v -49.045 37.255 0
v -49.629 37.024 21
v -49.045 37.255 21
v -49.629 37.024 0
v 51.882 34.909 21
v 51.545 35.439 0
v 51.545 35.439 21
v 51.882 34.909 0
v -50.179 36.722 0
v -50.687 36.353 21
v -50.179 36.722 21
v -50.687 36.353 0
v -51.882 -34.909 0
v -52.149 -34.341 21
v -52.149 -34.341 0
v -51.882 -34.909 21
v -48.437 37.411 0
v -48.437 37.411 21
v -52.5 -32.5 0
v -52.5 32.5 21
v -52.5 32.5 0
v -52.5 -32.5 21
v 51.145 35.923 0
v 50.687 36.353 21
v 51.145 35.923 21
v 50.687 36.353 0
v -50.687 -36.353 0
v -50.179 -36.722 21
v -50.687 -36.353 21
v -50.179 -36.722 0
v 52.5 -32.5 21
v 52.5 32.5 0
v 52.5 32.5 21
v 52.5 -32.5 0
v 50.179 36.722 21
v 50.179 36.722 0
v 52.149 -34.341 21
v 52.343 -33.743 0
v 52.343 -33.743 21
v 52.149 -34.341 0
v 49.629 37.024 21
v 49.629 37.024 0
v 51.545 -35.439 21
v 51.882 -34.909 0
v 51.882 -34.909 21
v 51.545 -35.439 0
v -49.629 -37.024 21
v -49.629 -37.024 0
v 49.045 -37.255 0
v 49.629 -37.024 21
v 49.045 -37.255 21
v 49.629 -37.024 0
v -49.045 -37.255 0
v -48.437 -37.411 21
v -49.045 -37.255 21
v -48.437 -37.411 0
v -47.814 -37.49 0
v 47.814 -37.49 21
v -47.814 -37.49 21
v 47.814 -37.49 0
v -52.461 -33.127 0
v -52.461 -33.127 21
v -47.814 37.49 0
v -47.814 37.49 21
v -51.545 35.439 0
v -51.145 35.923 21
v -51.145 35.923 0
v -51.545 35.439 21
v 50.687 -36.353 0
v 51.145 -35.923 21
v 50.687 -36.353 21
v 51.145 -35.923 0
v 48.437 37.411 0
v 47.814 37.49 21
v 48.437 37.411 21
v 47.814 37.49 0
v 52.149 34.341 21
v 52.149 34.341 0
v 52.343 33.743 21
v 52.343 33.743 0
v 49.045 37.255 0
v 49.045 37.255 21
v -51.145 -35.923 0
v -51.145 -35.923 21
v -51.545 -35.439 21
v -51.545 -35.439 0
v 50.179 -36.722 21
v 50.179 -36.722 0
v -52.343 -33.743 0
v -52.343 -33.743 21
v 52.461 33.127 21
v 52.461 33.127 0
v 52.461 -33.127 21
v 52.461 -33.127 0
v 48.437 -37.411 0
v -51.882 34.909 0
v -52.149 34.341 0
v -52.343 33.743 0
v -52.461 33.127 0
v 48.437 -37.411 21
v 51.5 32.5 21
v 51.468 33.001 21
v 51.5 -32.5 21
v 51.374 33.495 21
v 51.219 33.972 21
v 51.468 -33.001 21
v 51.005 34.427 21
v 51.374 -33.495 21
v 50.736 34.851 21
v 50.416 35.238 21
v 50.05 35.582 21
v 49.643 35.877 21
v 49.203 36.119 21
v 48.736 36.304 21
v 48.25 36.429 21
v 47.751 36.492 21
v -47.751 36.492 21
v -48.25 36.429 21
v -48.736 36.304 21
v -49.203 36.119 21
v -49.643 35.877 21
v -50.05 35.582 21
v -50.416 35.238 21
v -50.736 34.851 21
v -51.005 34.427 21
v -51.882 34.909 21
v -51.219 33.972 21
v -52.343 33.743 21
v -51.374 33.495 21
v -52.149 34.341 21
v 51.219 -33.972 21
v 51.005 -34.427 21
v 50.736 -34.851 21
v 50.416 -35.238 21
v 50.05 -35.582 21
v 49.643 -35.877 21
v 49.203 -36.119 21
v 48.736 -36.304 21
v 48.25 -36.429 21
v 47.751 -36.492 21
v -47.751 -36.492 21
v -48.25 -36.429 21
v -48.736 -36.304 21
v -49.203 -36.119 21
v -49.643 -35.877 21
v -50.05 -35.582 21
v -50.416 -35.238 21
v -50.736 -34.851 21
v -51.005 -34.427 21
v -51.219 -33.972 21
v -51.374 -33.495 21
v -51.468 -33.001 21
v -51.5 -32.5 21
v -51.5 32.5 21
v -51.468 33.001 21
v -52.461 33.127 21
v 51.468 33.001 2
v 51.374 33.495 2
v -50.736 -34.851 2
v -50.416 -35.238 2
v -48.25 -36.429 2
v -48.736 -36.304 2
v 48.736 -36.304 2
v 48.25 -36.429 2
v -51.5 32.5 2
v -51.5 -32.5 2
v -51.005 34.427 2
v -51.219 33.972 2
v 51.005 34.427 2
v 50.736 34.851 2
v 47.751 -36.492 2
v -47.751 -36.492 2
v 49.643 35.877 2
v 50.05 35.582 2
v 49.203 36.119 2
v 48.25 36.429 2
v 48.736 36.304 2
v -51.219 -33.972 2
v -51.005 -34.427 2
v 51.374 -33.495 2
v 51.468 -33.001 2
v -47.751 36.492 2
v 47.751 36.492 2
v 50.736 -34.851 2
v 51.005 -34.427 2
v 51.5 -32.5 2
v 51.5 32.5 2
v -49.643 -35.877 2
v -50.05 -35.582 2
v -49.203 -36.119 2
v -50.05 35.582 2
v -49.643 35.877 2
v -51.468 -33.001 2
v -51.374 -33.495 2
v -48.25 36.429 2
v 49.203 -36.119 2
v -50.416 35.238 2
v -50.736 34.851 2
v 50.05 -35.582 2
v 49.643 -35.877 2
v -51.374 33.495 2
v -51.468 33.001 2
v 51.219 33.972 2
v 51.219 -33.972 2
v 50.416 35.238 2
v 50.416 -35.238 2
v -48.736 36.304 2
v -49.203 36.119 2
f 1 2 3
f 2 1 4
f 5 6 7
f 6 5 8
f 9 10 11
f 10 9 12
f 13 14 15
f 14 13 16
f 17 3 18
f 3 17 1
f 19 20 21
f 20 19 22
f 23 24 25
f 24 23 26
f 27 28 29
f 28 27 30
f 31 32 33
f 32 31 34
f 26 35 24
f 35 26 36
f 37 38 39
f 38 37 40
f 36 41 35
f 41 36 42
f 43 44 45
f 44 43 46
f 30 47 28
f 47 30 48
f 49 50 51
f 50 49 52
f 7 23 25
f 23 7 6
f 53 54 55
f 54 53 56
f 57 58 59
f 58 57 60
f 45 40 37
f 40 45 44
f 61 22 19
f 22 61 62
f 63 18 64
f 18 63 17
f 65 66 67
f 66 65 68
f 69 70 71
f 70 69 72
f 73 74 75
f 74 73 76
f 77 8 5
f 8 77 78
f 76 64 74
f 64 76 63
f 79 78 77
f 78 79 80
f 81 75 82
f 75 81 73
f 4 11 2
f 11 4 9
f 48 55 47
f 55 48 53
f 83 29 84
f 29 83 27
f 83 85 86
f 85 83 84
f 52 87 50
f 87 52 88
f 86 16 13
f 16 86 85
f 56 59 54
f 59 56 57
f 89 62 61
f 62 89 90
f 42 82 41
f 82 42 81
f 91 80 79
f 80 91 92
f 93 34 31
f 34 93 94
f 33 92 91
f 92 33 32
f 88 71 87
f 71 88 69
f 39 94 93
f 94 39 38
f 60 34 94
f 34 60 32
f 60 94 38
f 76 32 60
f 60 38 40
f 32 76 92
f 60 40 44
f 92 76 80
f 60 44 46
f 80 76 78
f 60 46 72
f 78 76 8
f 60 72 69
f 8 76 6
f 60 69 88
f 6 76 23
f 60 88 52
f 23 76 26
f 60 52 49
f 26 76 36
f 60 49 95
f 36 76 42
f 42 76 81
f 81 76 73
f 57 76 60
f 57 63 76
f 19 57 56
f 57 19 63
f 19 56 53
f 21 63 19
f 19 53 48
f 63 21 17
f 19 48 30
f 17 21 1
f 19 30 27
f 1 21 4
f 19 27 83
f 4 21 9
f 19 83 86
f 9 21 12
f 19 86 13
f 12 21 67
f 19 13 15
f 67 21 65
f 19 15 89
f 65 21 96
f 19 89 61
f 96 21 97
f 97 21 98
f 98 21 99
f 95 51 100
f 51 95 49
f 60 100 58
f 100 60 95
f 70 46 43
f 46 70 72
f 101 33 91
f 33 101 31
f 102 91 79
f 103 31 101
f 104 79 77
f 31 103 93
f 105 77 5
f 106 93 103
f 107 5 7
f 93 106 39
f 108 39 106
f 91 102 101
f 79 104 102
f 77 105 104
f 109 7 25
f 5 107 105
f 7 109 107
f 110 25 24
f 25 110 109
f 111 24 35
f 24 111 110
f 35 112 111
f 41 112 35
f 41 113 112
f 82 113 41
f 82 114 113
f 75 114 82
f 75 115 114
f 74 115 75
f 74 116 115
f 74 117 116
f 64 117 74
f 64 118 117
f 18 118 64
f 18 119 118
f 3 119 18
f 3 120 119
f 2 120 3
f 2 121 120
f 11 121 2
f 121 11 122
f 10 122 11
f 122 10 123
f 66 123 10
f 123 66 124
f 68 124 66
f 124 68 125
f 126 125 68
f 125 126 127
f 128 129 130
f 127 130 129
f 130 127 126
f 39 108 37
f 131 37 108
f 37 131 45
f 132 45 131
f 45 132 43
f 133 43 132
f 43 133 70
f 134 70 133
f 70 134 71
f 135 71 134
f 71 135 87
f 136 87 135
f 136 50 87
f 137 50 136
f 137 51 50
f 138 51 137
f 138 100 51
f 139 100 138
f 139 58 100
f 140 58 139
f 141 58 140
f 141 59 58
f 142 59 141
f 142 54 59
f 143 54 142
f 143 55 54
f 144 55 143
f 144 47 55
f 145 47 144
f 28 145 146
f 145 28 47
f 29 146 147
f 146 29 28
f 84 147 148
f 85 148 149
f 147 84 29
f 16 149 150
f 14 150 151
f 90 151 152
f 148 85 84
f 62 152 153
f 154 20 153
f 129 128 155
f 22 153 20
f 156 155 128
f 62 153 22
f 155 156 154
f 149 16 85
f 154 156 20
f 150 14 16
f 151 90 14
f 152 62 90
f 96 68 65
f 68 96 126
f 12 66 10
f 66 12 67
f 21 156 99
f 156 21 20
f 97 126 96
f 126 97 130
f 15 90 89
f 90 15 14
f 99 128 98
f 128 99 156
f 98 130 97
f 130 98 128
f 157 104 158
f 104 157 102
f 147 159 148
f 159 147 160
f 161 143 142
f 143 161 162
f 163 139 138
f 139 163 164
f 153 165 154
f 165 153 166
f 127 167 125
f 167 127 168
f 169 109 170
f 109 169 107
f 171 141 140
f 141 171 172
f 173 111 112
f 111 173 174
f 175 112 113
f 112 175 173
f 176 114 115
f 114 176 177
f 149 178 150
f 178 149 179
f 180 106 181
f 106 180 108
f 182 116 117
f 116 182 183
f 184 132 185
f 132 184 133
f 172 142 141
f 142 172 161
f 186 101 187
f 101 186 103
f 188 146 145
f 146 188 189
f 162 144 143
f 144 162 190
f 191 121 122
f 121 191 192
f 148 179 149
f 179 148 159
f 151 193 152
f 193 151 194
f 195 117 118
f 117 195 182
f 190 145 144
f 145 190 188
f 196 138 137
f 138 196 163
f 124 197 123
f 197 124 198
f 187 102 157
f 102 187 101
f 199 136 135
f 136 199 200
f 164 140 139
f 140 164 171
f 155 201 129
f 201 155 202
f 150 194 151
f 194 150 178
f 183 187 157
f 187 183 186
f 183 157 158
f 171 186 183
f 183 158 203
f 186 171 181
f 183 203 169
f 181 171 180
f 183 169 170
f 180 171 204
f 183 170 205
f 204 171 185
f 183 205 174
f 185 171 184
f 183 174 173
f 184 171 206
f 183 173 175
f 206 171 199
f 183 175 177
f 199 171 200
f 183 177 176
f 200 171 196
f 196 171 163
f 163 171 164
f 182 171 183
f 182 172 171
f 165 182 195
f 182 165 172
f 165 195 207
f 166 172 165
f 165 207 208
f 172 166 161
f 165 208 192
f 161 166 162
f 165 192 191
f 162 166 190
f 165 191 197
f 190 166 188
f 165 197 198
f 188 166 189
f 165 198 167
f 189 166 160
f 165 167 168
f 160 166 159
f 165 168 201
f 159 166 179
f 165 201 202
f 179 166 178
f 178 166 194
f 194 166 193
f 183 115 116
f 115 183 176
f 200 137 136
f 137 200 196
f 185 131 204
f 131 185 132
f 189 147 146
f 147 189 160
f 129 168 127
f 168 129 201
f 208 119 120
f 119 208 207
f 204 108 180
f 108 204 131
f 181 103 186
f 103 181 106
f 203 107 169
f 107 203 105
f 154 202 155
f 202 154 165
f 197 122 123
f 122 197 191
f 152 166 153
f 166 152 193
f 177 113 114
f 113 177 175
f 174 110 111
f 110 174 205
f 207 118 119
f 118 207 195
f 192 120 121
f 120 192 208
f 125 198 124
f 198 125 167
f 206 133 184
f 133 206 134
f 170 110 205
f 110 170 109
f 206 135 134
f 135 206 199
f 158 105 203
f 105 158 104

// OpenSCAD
$fn = 50;


difference() {
	union() {
		hull() {
			translate(v = [-47.5000000000, 32.5000000000, 0]) {
				cylinder(h = 21, r = 5);
			}
			translate(v = [47.5000000000, 32.5000000000, 0]) {
				cylinder(h = 21, r = 5);
			}
			translate(v = [-47.5000000000, -32.5000000000, 0]) {
				cylinder(h = 21, r = 5);
			}
			translate(v = [47.5000000000, -32.5000000000, 0]) {
				cylinder(h = 21, r = 5);
			}
		}
	}
	union() {
		translate(v = [0, 0, 2]) {
			hull() {
				translate(v = [-47.5000000000, 32.5000000000, 0]) {
					cylinder(h = 19, r = 4);
				}
				translate(v = [47.5000000000, 32.5000000000, 0]) {
					cylinder(h = 19, r = 4);
				}
				translate(v = [-47.5000000000, -32.5000000000, 0]) {
					cylinder(h = 19, r = 4);
				}
				translate(v = [47.5000000000, -32.5000000000, 0]) {
					cylinder(h = 19, r = 4);
				}
			}
		}
	}
}
